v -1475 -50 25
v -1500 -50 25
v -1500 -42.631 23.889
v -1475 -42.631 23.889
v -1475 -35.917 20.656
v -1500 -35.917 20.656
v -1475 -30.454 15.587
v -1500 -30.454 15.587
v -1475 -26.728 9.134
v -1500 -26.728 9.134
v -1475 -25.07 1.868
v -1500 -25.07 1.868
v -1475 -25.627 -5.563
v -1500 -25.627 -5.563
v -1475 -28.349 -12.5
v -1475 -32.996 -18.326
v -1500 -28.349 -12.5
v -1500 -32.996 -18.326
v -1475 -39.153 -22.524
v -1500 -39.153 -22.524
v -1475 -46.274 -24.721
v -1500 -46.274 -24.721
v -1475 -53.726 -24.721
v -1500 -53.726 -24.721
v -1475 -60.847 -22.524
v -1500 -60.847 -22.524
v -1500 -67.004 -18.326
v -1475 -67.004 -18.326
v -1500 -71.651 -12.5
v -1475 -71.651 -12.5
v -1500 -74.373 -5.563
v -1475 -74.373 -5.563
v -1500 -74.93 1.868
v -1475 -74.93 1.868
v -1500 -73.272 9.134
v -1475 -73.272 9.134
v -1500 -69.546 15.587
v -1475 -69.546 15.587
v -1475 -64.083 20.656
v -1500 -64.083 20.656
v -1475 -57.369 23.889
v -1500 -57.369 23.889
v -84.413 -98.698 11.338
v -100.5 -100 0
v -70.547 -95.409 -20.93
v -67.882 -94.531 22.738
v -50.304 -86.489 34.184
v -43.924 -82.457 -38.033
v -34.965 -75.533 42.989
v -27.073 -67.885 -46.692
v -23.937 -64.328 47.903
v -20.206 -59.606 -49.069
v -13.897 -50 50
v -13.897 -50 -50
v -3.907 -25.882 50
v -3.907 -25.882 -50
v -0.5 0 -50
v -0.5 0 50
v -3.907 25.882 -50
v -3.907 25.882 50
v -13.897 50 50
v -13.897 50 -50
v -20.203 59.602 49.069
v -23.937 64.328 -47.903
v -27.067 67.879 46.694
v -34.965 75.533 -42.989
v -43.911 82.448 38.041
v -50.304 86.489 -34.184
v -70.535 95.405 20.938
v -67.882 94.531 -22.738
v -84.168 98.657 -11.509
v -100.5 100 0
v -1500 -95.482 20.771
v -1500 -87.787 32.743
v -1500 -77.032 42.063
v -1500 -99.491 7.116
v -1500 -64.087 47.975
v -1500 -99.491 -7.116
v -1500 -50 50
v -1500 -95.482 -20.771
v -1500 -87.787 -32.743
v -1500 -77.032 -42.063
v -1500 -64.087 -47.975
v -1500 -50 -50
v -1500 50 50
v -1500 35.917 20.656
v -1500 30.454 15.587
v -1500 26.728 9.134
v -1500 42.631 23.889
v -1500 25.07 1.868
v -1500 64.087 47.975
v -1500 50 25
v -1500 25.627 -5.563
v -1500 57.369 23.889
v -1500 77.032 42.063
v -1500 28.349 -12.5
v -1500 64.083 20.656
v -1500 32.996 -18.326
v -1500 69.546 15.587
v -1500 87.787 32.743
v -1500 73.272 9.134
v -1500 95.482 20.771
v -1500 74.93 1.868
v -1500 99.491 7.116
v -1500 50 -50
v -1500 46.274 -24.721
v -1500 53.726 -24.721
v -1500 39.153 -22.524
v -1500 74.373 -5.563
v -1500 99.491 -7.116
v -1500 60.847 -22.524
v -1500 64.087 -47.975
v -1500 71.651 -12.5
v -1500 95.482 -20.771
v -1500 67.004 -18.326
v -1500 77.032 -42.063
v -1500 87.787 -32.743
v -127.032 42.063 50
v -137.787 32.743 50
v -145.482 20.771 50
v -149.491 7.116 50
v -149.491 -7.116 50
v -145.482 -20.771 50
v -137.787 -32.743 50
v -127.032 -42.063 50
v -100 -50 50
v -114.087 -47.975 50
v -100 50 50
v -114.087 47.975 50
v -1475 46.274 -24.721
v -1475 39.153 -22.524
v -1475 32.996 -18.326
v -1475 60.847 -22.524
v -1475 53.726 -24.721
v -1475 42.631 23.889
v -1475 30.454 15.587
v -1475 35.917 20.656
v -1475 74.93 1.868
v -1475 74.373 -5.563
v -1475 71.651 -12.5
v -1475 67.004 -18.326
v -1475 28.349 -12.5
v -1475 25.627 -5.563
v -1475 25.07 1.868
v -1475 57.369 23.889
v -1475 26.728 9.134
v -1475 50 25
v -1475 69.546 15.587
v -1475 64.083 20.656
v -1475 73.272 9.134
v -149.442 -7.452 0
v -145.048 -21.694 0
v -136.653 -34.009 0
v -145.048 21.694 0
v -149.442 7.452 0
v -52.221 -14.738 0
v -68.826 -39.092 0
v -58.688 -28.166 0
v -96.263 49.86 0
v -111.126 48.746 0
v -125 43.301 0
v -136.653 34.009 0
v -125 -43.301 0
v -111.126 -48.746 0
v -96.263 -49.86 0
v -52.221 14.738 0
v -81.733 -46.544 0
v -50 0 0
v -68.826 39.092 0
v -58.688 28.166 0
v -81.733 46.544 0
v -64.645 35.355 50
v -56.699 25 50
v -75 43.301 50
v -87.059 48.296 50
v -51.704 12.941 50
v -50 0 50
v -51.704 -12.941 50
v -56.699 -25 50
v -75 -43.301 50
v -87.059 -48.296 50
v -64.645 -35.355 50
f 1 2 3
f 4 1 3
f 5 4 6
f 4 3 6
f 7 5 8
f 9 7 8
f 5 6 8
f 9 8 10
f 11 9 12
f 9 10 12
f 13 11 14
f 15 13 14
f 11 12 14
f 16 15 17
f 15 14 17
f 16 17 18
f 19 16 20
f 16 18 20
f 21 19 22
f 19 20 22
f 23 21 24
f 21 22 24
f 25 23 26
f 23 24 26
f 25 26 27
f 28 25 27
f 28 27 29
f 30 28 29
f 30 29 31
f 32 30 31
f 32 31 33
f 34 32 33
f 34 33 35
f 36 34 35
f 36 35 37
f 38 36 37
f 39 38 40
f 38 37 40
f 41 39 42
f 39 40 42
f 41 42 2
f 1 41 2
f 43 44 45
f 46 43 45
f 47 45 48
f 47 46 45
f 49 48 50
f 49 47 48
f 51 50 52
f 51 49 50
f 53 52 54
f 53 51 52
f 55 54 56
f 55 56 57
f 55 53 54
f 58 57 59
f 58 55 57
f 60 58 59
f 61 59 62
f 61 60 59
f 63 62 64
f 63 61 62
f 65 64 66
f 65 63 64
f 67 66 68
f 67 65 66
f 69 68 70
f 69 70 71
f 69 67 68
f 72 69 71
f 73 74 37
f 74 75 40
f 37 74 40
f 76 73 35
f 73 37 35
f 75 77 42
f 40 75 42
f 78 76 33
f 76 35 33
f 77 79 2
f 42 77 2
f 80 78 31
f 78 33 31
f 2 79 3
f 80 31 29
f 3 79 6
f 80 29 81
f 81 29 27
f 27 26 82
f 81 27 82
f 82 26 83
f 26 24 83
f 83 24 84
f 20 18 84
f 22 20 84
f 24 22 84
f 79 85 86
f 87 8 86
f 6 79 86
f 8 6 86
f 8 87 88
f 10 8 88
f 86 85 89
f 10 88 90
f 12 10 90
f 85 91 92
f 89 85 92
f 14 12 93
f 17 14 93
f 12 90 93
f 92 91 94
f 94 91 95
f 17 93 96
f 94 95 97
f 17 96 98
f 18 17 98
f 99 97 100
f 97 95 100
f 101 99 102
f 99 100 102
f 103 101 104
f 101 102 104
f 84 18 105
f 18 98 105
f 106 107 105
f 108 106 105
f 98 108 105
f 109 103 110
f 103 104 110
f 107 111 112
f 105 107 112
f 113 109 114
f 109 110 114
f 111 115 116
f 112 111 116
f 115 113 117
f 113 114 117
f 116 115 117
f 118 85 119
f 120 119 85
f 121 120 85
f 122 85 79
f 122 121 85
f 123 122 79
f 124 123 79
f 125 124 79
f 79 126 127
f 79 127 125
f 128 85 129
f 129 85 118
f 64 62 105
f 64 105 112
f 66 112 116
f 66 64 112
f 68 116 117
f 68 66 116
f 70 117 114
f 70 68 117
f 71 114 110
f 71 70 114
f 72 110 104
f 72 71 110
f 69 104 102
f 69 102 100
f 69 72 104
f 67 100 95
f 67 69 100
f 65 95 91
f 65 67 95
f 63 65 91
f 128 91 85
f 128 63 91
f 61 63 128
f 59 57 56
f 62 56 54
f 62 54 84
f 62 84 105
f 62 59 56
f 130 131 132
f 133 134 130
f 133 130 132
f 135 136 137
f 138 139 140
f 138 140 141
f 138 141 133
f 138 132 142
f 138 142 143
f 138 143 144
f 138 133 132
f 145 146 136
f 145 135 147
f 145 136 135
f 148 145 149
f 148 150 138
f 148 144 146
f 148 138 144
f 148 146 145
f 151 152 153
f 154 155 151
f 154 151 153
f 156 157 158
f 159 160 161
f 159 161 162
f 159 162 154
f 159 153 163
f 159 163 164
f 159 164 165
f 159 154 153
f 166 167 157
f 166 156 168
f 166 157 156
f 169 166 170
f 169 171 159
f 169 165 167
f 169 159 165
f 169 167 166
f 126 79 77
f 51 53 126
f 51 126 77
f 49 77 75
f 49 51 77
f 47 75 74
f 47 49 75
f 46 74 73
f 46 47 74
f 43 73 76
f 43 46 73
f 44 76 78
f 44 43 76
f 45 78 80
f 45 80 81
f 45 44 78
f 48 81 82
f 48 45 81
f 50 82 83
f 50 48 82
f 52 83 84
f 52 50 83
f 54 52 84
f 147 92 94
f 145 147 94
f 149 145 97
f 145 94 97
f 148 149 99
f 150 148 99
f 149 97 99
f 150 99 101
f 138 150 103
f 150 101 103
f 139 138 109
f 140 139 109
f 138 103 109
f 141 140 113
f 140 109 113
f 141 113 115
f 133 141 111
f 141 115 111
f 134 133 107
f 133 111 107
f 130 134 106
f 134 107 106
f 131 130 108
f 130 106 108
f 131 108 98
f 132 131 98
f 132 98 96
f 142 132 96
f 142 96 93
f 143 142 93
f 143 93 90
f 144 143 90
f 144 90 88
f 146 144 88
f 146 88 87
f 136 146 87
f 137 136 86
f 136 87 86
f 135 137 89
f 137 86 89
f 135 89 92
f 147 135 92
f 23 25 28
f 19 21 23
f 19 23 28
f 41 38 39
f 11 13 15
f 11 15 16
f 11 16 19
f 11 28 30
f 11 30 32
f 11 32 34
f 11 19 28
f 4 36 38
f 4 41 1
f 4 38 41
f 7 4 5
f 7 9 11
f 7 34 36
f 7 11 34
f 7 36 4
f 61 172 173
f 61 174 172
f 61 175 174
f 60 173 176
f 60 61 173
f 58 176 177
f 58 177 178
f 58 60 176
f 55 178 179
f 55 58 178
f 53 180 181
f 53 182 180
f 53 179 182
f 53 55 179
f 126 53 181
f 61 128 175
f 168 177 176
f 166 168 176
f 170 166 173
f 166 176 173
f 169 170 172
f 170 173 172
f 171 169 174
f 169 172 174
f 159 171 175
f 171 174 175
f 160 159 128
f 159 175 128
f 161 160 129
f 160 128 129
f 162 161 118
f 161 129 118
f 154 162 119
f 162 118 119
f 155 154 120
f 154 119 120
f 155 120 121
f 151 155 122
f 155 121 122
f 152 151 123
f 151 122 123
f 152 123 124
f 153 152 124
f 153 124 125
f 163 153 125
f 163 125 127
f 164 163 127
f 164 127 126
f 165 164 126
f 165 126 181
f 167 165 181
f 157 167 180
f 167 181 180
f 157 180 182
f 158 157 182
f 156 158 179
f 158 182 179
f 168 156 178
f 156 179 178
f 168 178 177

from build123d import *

# Parameters (mm, degrees)
BOSS_EXTRUDE1_DEPTH = 1500
CUT_EXTRUDE1_DEPTH  = 100
SKETCH3_R           = 50
CUT_EXTRUDE2_DEPTH  = 50
SKETCH4_R           = 25
CUT_EXTRUDE3_DEPTH  = 25


with BuildPart() as part:
    # Sketch1 → Boss-Extrude1 (new body)
    with BuildSketch(Plane(origin=(0, 0, 0), x_dir=(0, 0, -1), z_dir=(1, 0, 0))):
        with BuildLine():
            Line((-50, 50), (-50, -50))
            ThreePointArc((-50, -50), (0, -100), (50, -50))
            Line((50, -50), (50, 50))
            ThreePointArc((50, 50), (0, 100), (-50, 50))
        make_face()
    extrude(amount=-BOSS_EXTRUDE1_DEPTH)

    # Sketch2 → Cut-Extrude1 (cut)
    with BuildSketch(Plane.XY.offset(50)):
        with BuildLine():
            Line((-100.5, 100), (0, 100))
            Line((0, 100), (0, -100))
            Line((0, -100), (-100.5, -100))
            ThreePointArc((-100.5, -100), (-0.5, 0), (-100.5, 100))
        make_face()
    extrude(amount=-CUT_EXTRUDE1_DEPTH, mode=Mode.SUBTRACT)

    # Sketch3 → Cut-Extrude2 (cut)
    with BuildSketch(Plane.XY.offset(50)):
        with Locations((-100, 0)):
            Circle(SKETCH3_R)
    extrude(amount=-CUT_EXTRUDE2_DEPTH, mode=Mode.SUBTRACT)

    # Sketch4 → Cut-Extrude3 (cut)
    with BuildSketch(Plane.ZY.offset(1500)):
        with Locations((0, 50)):
            Circle(SKETCH4_R)
        with Locations((0, -50)):
            Circle(SKETCH4_R)
    extrude(amount=-CUT_EXTRUDE3_DEPTH, mode=Mode.SUBTRACT)


solid = part.part
